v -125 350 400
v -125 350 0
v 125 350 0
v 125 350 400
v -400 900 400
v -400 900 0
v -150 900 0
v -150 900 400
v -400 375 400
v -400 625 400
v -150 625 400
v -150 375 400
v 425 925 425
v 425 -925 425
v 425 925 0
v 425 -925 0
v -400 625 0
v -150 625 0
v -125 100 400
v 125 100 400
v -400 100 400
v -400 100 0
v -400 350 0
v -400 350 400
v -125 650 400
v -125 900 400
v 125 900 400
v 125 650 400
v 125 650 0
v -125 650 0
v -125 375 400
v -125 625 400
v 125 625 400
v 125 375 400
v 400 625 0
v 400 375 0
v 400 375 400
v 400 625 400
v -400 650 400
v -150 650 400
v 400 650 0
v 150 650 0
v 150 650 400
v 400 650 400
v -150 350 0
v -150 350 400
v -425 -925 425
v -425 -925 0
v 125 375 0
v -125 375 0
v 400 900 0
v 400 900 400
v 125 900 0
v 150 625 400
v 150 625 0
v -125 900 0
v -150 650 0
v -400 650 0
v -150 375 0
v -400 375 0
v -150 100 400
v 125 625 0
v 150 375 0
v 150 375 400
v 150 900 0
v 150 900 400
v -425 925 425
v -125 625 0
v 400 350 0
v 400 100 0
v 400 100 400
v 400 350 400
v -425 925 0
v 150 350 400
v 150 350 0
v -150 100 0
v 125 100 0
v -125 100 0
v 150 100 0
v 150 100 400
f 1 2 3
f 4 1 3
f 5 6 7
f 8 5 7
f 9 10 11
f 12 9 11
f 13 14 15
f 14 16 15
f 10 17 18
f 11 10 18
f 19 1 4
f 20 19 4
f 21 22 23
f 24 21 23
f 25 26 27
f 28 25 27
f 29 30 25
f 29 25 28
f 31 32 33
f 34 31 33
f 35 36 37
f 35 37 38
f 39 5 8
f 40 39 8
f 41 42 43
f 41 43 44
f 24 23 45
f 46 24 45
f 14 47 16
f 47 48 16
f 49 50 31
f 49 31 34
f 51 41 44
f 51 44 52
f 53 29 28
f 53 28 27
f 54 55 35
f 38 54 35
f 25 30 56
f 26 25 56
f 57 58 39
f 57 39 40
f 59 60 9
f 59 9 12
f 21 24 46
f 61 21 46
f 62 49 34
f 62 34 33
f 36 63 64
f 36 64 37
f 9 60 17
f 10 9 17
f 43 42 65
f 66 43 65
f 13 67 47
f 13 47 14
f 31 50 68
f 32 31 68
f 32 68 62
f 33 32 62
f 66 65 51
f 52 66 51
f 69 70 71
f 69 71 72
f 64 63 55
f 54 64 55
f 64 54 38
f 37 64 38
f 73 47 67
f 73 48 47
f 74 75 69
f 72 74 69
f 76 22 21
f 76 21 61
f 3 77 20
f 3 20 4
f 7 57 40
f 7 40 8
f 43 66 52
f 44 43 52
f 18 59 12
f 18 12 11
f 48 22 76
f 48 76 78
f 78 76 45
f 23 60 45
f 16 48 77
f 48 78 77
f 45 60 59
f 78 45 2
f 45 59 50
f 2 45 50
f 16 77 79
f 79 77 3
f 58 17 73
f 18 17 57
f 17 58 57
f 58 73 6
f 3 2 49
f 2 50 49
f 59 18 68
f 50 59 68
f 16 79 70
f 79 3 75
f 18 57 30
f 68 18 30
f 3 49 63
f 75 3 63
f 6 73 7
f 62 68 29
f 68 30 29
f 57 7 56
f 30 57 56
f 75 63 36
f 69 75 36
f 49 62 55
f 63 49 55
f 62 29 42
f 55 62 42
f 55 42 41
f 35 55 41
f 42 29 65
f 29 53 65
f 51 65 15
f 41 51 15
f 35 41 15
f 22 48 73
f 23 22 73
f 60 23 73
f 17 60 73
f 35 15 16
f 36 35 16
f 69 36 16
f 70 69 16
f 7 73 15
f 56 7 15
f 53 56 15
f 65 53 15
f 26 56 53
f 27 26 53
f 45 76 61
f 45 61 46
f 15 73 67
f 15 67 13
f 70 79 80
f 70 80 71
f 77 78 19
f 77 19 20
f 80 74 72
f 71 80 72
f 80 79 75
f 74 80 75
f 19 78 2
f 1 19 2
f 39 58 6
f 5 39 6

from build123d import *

# Parameters (mm, degrees)
SKETCH1_W           = 850
SKETCH1_H           = 1850
SKETCH1_W_2         = 250
SKETCH1_H_2         = 250
BOSS_EXTRUDE1_DEPTH = 400
SKETCH2_W           = 850
SKETCH2_H           = 1850
BOSS_EXTRUDE2_DEPTH = 25


with BuildPart() as part:
    # Sketch1 → Boss-Extrude1 (new body)
    with BuildSketch(Plane.XY):
        Rectangle(SKETCH1_W, SKETCH1_H)
        with Locations((275, 500)):
            Rectangle(SKETCH1_W_2, SKETCH1_H_2, mode=Mode.SUBTRACT)
        with Locations((275, 775)):
            Rectangle(SKETCH1_W_2, SKETCH1_H_2, mode=Mode.SUBTRACT)
        with Locations((0, 775)):
            Rectangle(SKETCH1_W_2, SKETCH1_H_2, mode=Mode.SUBTRACT)
        with Locations((-275, 775)):
            Rectangle(SKETCH1_W_2, SKETCH1_H_2, mode=Mode.SUBTRACT)
        with Locations((0, 500)):
            Rectangle(SKETCH1_W_2, SKETCH1_H_2, mode=Mode.SUBTRACT)
        with Locations((-275, 500)):
            Rectangle(SKETCH1_W_2, SKETCH1_H_2, mode=Mode.SUBTRACT)
        with Locations((275, 225)):
            Rectangle(SKETCH1_W_2, SKETCH1_H_2, mode=Mode.SUBTRACT)
        with Locations((0, 225)):
            Rectangle(SKETCH1_W_2, SKETCH1_H_2, mode=Mode.SUBTRACT)
        with Locations((-275, 225)):
            Rectangle(SKETCH1_W_2, SKETCH1_H_2, mode=Mode.SUBTRACT)
    extrude(amount=BOSS_EXTRUDE1_DEPTH)

    # Sketch2 → Boss-Extrude2 (add)
    with BuildSketch(Plane.XY.offset(400)):
        Rectangle(SKETCH2_W, SKETCH2_H)
    extrude(amount=BOSS_EXTRUDE2_DEPTH)


solid = part.part
